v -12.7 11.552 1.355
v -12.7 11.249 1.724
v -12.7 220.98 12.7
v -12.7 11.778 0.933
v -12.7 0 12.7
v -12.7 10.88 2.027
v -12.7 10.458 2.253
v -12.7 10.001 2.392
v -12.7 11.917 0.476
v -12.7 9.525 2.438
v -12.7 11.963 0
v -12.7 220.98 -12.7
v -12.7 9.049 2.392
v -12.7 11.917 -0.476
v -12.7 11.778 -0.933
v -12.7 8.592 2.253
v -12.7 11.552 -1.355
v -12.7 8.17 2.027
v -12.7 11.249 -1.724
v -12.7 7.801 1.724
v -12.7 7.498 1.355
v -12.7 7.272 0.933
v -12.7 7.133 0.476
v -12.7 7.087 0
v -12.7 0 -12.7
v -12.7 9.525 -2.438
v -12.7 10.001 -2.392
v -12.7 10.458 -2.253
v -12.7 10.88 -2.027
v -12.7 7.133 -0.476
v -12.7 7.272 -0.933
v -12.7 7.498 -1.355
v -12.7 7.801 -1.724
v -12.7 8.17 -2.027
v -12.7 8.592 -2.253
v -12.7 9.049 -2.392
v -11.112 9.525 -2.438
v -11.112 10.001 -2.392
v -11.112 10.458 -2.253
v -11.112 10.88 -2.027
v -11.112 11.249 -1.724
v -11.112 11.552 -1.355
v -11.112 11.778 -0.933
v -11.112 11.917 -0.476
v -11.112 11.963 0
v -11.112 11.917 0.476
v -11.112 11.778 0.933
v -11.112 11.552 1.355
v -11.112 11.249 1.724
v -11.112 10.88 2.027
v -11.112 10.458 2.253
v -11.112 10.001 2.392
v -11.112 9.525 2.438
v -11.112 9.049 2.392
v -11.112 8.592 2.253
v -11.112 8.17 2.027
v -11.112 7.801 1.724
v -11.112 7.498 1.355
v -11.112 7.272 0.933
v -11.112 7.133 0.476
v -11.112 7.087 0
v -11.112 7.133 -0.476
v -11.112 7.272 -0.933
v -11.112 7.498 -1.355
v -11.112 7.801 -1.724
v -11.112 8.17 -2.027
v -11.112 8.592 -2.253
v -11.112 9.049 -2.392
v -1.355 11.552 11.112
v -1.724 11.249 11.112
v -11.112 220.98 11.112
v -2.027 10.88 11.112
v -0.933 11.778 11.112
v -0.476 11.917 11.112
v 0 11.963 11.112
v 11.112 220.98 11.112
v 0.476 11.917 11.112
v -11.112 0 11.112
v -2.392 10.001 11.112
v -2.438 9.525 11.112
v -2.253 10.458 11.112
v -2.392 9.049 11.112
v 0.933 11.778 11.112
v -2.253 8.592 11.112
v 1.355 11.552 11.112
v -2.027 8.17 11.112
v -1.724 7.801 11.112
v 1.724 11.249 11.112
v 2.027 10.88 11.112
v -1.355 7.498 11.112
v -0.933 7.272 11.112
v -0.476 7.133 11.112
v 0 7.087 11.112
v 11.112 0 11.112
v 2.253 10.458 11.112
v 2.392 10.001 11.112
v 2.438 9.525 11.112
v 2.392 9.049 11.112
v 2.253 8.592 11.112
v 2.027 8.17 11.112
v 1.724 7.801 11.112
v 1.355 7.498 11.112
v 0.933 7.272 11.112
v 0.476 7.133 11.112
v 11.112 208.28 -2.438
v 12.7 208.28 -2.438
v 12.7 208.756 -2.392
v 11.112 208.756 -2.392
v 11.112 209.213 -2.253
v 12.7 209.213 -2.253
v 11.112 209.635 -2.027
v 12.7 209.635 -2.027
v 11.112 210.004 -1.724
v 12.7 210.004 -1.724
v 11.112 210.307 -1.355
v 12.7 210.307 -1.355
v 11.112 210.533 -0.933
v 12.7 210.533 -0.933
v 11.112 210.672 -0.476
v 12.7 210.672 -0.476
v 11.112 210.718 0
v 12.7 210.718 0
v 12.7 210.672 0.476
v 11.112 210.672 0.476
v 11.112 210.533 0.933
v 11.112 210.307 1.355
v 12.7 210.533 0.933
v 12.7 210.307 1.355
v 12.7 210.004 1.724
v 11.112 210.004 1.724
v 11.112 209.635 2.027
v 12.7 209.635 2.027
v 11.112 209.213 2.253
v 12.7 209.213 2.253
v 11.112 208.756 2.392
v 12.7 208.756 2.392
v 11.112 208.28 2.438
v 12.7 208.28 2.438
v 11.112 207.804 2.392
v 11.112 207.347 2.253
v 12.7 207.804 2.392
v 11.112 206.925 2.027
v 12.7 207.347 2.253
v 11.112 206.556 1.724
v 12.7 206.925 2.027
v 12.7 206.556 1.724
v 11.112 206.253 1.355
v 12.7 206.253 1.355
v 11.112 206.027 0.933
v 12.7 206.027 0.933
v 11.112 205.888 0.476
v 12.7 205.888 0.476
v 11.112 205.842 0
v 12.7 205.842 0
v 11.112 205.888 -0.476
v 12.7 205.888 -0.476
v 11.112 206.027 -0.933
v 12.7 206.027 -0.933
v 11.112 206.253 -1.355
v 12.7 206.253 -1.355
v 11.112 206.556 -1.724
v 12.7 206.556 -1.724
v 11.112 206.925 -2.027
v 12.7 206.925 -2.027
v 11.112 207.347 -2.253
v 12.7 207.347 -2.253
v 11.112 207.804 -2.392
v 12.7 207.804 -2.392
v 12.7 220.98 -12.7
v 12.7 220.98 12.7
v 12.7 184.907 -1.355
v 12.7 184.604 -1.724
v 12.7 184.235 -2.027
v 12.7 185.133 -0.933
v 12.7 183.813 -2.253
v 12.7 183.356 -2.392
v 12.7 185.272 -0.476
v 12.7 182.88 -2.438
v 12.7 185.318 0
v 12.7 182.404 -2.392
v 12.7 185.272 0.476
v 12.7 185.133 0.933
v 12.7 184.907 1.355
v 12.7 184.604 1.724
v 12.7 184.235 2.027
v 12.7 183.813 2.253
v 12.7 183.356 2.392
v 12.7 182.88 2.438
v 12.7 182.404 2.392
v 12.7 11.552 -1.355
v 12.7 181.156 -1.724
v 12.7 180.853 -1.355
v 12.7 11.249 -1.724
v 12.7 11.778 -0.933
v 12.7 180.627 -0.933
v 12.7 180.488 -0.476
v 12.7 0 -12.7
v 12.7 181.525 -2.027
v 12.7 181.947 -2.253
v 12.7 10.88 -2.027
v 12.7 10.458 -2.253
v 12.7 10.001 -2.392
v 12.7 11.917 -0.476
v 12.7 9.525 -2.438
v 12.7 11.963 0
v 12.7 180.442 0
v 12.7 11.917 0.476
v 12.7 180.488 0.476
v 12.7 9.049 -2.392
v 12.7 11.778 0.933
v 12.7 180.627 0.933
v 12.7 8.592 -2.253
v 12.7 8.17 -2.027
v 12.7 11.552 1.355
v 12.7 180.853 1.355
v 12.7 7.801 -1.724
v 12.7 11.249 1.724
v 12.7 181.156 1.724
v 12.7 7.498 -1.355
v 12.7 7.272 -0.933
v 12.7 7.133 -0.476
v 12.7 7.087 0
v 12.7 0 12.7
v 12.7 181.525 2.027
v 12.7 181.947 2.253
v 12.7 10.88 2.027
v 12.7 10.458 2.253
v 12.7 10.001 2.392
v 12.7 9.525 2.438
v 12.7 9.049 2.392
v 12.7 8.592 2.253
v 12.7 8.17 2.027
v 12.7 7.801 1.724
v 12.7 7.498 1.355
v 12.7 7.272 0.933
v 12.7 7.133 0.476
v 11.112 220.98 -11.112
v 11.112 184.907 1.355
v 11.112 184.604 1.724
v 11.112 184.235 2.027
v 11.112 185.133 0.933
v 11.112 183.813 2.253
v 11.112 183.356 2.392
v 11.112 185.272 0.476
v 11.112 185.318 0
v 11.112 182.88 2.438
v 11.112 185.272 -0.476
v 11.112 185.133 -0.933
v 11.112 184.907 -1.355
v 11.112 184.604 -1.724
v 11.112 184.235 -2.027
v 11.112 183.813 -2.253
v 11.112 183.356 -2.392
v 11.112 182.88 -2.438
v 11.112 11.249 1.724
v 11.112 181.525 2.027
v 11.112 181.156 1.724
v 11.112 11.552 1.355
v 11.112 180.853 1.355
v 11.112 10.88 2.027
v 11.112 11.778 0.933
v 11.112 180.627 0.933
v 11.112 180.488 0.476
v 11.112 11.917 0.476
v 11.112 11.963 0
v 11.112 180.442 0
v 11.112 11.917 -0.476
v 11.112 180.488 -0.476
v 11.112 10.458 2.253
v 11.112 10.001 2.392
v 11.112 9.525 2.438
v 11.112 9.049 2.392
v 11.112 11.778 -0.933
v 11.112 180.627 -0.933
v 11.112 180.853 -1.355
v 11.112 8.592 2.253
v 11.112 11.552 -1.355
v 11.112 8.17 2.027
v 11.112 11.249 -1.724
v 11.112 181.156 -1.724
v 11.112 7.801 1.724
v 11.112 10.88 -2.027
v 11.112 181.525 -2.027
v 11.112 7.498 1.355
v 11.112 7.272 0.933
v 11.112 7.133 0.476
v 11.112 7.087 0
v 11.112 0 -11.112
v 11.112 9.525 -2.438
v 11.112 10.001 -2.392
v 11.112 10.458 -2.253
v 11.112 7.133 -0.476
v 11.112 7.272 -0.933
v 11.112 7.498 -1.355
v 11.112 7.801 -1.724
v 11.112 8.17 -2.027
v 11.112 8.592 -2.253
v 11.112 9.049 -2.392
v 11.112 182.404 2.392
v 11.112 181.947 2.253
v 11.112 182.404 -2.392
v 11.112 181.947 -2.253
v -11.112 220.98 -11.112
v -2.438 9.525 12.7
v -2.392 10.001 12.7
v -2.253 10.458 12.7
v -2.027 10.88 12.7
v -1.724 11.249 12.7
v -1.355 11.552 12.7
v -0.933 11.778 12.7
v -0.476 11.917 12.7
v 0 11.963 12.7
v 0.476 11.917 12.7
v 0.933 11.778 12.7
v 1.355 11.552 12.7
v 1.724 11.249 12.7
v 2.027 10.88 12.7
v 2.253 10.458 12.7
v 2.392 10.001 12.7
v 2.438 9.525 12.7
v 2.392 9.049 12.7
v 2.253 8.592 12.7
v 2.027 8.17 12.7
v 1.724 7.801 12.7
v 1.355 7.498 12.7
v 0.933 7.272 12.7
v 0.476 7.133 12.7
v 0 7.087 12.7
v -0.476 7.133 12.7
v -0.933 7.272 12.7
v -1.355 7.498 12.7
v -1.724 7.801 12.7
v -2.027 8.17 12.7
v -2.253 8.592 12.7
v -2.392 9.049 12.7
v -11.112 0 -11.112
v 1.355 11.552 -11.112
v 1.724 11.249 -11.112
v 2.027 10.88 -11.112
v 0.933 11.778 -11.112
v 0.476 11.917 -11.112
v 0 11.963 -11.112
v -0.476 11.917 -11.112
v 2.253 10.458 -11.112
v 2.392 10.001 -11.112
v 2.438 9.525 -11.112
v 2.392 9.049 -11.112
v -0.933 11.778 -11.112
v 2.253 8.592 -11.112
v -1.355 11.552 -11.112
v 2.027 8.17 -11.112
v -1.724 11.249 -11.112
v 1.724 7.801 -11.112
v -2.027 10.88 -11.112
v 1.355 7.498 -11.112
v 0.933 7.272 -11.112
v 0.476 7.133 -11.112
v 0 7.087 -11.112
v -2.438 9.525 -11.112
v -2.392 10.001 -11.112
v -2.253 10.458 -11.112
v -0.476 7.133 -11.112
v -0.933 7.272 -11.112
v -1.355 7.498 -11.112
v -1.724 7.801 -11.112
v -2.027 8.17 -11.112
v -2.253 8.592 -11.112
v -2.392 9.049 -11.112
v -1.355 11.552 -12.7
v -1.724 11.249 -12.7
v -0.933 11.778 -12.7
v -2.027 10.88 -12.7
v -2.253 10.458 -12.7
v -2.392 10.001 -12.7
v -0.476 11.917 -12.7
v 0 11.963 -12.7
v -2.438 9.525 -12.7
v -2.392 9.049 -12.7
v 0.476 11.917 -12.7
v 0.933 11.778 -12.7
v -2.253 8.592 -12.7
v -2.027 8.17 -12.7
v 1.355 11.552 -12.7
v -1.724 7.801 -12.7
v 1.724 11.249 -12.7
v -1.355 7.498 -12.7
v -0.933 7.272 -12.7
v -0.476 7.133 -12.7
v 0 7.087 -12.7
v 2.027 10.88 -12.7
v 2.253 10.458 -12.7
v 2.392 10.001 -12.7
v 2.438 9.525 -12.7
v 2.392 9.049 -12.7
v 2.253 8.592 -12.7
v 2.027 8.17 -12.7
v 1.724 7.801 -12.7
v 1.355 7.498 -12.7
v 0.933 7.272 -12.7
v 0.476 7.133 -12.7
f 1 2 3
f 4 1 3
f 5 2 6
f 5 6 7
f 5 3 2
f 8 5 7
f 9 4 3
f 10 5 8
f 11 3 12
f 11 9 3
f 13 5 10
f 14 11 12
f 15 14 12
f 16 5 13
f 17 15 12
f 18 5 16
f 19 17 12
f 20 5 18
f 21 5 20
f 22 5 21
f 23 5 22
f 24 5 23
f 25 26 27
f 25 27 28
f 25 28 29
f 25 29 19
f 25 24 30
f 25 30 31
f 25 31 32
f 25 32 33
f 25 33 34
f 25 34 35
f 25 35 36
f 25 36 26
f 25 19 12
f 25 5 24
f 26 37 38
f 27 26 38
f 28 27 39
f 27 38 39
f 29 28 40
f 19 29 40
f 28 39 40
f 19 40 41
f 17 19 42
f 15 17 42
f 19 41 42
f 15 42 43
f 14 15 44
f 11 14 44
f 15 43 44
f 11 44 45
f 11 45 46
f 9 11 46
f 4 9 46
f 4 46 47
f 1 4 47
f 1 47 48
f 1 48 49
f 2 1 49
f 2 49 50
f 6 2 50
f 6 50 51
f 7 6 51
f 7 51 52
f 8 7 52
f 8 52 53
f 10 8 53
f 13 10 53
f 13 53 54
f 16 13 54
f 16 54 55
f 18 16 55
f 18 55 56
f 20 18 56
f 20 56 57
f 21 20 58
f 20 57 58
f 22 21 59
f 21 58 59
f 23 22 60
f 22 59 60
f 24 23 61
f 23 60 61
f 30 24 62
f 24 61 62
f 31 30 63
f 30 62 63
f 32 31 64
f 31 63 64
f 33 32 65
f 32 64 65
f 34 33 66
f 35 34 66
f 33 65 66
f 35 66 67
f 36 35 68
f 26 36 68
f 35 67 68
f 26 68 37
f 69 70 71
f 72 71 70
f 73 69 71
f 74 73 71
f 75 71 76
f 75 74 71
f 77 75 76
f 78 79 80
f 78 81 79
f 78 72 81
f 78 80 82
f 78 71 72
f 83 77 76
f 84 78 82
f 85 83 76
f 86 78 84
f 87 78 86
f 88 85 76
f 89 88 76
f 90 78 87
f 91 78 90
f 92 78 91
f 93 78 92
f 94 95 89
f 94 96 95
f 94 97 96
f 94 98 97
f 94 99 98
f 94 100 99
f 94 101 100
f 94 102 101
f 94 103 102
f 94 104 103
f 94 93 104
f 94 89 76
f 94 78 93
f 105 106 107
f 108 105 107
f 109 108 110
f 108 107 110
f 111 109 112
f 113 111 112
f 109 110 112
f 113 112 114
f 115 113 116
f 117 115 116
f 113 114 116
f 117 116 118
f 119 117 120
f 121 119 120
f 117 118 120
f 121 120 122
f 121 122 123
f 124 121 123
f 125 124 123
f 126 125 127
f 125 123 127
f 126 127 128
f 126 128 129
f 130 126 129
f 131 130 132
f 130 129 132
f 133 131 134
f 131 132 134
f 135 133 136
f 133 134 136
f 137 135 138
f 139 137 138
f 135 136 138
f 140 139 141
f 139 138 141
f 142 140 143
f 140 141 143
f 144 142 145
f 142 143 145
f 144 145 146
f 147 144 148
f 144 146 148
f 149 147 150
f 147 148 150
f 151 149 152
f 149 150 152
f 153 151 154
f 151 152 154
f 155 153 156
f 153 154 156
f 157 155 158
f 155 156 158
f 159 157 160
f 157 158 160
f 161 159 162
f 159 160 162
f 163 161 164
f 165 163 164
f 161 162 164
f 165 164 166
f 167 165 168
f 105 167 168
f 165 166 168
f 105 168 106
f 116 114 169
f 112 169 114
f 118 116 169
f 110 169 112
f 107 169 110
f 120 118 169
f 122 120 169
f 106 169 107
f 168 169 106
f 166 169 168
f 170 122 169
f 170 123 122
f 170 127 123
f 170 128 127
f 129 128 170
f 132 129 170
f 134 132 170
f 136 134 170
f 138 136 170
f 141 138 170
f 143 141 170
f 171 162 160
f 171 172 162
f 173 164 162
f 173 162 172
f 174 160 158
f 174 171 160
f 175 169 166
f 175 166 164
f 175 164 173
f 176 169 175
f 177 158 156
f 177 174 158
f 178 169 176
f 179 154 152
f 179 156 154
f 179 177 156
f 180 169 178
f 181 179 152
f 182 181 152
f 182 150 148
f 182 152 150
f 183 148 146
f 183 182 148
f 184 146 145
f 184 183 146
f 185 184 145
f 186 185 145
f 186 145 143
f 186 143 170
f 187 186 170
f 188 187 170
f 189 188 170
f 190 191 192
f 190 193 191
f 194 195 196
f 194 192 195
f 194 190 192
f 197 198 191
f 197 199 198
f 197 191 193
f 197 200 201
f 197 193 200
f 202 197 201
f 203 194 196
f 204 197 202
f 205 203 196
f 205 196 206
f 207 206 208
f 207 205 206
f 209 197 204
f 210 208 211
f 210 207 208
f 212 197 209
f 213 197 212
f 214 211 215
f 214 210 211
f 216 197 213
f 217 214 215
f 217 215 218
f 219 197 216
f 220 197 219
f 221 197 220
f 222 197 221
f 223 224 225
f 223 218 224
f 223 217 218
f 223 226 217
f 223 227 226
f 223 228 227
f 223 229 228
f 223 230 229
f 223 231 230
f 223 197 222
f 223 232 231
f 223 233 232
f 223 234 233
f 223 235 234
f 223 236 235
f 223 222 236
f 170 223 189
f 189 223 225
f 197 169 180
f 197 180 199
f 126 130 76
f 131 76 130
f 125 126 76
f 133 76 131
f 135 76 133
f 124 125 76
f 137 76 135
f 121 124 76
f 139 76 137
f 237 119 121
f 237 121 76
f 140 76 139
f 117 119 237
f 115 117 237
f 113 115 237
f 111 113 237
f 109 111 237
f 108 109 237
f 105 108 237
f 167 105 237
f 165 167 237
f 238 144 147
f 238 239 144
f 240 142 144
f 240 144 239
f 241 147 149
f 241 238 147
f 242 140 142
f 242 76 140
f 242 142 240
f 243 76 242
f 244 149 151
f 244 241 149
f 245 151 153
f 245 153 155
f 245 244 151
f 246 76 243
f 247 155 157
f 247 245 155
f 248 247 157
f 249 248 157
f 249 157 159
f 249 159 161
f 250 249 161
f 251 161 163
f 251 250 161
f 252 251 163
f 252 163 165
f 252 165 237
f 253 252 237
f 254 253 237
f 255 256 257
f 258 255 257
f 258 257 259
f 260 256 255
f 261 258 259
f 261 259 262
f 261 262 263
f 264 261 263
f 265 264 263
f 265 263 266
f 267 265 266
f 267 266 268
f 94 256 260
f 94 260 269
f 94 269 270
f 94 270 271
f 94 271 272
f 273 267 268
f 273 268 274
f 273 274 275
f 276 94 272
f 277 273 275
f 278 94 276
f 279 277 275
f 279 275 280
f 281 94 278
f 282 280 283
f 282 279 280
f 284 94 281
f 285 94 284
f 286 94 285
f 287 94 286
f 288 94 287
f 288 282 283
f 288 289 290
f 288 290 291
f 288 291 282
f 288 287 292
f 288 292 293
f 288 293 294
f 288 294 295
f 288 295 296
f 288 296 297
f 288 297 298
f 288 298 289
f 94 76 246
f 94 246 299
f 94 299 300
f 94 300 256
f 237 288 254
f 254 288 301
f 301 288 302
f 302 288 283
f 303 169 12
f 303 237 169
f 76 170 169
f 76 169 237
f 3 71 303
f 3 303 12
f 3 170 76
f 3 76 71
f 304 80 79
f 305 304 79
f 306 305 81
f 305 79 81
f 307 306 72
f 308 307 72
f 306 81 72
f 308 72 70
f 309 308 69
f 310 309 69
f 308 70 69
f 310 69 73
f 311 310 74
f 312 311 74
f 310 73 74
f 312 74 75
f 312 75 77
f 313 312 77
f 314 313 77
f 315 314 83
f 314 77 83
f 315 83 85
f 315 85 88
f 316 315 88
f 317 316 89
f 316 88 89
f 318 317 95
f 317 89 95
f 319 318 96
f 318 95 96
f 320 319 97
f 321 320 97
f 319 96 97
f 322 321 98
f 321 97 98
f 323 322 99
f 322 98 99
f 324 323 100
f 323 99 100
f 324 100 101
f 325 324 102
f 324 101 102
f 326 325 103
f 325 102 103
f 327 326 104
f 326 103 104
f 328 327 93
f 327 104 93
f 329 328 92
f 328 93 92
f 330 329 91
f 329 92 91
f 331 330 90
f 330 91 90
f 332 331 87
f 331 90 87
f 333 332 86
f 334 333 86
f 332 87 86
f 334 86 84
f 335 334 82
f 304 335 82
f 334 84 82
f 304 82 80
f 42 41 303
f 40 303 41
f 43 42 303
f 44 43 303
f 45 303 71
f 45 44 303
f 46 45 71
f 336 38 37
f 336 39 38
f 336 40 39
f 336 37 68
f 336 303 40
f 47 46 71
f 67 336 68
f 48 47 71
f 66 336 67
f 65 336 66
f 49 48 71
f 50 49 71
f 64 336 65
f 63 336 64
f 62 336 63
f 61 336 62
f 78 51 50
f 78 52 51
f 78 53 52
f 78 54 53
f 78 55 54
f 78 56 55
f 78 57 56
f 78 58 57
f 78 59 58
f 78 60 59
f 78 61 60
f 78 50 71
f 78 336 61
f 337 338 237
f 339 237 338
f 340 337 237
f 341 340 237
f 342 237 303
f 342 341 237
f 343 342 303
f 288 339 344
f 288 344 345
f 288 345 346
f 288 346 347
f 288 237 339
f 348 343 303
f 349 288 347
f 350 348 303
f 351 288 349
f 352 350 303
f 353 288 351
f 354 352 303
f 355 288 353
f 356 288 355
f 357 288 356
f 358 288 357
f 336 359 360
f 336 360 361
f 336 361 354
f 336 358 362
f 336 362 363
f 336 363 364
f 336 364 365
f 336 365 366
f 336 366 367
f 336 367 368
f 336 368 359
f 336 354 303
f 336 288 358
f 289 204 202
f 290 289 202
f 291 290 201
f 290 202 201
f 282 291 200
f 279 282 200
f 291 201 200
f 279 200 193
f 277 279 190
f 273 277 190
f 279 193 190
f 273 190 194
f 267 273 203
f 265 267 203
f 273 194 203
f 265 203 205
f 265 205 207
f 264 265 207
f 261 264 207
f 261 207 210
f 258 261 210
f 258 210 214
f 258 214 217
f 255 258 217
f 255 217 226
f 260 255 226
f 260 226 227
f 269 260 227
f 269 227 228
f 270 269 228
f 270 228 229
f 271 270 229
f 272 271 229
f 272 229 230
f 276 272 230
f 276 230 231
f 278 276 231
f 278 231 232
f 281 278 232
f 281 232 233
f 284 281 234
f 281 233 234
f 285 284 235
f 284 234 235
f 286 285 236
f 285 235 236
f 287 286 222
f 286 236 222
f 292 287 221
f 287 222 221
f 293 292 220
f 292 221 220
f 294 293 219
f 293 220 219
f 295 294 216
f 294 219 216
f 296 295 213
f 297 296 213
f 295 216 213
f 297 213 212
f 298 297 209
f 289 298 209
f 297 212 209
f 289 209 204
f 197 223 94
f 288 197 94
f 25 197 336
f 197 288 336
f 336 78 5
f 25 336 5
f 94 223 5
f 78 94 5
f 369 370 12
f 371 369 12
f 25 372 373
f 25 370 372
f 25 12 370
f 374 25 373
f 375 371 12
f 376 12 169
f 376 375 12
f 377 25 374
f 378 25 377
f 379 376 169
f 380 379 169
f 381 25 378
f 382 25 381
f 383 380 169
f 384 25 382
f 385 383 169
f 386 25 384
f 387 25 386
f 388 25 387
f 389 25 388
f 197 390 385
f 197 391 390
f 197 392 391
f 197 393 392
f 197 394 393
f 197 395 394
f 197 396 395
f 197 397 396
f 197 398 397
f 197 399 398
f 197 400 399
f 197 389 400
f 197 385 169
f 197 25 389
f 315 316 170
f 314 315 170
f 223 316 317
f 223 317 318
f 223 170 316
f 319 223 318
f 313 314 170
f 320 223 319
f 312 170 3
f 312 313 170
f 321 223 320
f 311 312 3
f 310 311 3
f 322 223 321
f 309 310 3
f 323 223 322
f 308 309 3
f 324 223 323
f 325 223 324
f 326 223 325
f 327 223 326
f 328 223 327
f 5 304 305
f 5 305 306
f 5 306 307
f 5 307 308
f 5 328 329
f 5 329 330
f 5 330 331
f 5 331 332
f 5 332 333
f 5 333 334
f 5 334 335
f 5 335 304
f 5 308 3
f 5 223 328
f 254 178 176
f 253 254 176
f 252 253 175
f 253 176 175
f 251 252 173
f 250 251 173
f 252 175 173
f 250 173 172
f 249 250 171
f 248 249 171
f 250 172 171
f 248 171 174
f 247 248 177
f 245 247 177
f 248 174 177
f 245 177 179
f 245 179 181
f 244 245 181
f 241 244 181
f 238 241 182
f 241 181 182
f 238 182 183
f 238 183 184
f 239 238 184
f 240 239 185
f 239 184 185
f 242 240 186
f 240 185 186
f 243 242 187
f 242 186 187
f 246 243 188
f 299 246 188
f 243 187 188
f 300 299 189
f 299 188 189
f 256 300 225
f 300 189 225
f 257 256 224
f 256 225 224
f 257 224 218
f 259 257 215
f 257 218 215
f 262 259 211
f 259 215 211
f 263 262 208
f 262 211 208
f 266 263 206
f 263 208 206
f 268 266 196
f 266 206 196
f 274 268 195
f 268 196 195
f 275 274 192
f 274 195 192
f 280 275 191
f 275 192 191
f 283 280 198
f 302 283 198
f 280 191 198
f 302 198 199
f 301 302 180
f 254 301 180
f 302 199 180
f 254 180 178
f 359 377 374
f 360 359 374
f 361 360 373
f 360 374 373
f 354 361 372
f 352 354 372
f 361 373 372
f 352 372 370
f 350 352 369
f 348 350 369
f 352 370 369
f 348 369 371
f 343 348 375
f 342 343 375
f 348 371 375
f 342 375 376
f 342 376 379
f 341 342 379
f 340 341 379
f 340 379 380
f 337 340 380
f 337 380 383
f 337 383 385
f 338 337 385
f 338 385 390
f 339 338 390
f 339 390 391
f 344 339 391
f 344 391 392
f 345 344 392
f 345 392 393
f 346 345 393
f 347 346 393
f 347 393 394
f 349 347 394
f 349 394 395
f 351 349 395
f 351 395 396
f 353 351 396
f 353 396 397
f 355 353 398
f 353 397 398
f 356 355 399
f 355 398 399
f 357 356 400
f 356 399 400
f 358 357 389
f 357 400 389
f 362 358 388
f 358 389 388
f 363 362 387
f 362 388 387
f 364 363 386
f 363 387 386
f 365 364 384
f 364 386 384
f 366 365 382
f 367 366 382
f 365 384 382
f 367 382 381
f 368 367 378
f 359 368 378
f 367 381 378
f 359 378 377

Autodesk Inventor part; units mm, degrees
ref_plane "YZ Plane" through (0, 0, 0) normal (1, 0, 0) x (0, 1, 0)
ref_plane "XZ Plane" through (0, 0, 0) normal (0, 1, 0) x (-1, 0, 0)
ref_plane "XY Plane" through (0, 0, 0) normal (0, 0, 1) x (1, 0, 0)
sketch "Sketch1" plane through (0, 0, 0) normal (0, 1, 0) x (-1, 0, 0)
  line L0 (-12.7, 12.7) -> (12.7, 12.7)
  line L1 (12.7, 12.7) -> (12.7, -12.7)
  line L2 (12.7, -12.7) -> (-12.7, -12.7)
  line L3 (-12.7, -12.7) -> (-12.7, 12.7)
  line L4 (-12.7, 12.7) -> (12.7, -12.7) construction
  line L5 (12.7, 12.7) -> (-12.7, -12.7) construction
  line L6 (11.1125, -11.1125) -> (11.1125, 11.1125)
  line L7 (11.1125, 11.1125) -> (-11.1125, 11.1125)
  line L8 (-11.1125, 11.1125) -> (-11.1125, -11.1125)
  line L9 (-11.1125, -11.1125) -> (11.1125, -11.1125)
  point P0 (0, 0)
  dimension "d0" = 25.4
  dimension "d1" = 25.4
  dimension "d2" = 1.5875
extrude "Extrusion1" add sketch "Sketch1" along normal blind 220.98
sketch "Sketch2" plane through (12.7, 0, 12.7) normal (1, 0, 0) x (0, 0, -1)
  line L0 (12.7, 0) -> (22.225, 0) construction
  line L1 (0, 0) -> (25.4, 0) construction
  line L2 (12.7, 0) -> (3.175, 0) construction
  line L3 (3.175, 0) -> (3.175, 19.05) construction
  line L4 (3.175, 19.05) -> (22.225, 19.05) construction
  line L5 (22.225, 19.05) -> (22.225, 0) construction
  line L6 (3.175, 19.05) -> (22.225, 0) construction
  line L7 (22.225, 19.05) -> (3.175, 0) construction
  circle A0 centre (12.7, 9.525) radius 2.4384
  dimension "d5" = 9.525
  dimension "d7" = 9.525
  dimension "d8" = 19.05
  dimension "d9" = 4.8768
extrude "Extrusion2" cut sketch "Sketch2" against normal blind 25.4
sketch "Sketch3" plane through (12.7, 0, -12.7) normal (0, 0, -1) x (-1, 0, 0)
  line L0 (12.7, 0) -> (22.225, 0) construction
  line L1 (0, 0) -> (25.4, 0) construction
  line L2 (12.7, 0) -> (3.175, 0) construction
  line L3 (3.175, 0) -> (3.175, 19.05) construction
  line L4 (3.175, 19.05) -> (22.225, 19.05) construction
  line L5 (22.225, 19.05) -> (22.225, 0) construction
  line L6 (3.175, 19.05) -> (22.225, 0) construction
  line L7 (22.225, 19.05) -> (3.175, 0) construction
  circle A0 centre (12.7, 9.525) radius 2.4384
  point P0 (12.7, 0)
  dimension "d13" = 9.525
  dimension "d14" = 9.525
  dimension "d15" = 19.05
  dimension "d16" = 4.8768
extrude "Extrusion3" cut sketch "Sketch3" against normal blind 25.4
sketch "Sketch4" plane through (12.7, 0, 12.7) normal (1, 0, 0) x (0, 0, -1)
  circle A0 centre (12.7, 208.28) radius 2.4384
  circle A1 centre (12.7, 182.88) radius 2.4384
  line L0 (0, 220.98) -> (25.4, 220.98) projected
  point P0 (12.7, 0)
  dimension "d19" = 12.7
  dimension "d20" = 4.8768
  dimension "d21" = 25.4
extrude "Extrusion4" cut sketch "Sketch4" against normal blind 7.62
equation "\"d7\" = d5"
equation "\"d14\" = d13"
properties part number "metal tube piece"
